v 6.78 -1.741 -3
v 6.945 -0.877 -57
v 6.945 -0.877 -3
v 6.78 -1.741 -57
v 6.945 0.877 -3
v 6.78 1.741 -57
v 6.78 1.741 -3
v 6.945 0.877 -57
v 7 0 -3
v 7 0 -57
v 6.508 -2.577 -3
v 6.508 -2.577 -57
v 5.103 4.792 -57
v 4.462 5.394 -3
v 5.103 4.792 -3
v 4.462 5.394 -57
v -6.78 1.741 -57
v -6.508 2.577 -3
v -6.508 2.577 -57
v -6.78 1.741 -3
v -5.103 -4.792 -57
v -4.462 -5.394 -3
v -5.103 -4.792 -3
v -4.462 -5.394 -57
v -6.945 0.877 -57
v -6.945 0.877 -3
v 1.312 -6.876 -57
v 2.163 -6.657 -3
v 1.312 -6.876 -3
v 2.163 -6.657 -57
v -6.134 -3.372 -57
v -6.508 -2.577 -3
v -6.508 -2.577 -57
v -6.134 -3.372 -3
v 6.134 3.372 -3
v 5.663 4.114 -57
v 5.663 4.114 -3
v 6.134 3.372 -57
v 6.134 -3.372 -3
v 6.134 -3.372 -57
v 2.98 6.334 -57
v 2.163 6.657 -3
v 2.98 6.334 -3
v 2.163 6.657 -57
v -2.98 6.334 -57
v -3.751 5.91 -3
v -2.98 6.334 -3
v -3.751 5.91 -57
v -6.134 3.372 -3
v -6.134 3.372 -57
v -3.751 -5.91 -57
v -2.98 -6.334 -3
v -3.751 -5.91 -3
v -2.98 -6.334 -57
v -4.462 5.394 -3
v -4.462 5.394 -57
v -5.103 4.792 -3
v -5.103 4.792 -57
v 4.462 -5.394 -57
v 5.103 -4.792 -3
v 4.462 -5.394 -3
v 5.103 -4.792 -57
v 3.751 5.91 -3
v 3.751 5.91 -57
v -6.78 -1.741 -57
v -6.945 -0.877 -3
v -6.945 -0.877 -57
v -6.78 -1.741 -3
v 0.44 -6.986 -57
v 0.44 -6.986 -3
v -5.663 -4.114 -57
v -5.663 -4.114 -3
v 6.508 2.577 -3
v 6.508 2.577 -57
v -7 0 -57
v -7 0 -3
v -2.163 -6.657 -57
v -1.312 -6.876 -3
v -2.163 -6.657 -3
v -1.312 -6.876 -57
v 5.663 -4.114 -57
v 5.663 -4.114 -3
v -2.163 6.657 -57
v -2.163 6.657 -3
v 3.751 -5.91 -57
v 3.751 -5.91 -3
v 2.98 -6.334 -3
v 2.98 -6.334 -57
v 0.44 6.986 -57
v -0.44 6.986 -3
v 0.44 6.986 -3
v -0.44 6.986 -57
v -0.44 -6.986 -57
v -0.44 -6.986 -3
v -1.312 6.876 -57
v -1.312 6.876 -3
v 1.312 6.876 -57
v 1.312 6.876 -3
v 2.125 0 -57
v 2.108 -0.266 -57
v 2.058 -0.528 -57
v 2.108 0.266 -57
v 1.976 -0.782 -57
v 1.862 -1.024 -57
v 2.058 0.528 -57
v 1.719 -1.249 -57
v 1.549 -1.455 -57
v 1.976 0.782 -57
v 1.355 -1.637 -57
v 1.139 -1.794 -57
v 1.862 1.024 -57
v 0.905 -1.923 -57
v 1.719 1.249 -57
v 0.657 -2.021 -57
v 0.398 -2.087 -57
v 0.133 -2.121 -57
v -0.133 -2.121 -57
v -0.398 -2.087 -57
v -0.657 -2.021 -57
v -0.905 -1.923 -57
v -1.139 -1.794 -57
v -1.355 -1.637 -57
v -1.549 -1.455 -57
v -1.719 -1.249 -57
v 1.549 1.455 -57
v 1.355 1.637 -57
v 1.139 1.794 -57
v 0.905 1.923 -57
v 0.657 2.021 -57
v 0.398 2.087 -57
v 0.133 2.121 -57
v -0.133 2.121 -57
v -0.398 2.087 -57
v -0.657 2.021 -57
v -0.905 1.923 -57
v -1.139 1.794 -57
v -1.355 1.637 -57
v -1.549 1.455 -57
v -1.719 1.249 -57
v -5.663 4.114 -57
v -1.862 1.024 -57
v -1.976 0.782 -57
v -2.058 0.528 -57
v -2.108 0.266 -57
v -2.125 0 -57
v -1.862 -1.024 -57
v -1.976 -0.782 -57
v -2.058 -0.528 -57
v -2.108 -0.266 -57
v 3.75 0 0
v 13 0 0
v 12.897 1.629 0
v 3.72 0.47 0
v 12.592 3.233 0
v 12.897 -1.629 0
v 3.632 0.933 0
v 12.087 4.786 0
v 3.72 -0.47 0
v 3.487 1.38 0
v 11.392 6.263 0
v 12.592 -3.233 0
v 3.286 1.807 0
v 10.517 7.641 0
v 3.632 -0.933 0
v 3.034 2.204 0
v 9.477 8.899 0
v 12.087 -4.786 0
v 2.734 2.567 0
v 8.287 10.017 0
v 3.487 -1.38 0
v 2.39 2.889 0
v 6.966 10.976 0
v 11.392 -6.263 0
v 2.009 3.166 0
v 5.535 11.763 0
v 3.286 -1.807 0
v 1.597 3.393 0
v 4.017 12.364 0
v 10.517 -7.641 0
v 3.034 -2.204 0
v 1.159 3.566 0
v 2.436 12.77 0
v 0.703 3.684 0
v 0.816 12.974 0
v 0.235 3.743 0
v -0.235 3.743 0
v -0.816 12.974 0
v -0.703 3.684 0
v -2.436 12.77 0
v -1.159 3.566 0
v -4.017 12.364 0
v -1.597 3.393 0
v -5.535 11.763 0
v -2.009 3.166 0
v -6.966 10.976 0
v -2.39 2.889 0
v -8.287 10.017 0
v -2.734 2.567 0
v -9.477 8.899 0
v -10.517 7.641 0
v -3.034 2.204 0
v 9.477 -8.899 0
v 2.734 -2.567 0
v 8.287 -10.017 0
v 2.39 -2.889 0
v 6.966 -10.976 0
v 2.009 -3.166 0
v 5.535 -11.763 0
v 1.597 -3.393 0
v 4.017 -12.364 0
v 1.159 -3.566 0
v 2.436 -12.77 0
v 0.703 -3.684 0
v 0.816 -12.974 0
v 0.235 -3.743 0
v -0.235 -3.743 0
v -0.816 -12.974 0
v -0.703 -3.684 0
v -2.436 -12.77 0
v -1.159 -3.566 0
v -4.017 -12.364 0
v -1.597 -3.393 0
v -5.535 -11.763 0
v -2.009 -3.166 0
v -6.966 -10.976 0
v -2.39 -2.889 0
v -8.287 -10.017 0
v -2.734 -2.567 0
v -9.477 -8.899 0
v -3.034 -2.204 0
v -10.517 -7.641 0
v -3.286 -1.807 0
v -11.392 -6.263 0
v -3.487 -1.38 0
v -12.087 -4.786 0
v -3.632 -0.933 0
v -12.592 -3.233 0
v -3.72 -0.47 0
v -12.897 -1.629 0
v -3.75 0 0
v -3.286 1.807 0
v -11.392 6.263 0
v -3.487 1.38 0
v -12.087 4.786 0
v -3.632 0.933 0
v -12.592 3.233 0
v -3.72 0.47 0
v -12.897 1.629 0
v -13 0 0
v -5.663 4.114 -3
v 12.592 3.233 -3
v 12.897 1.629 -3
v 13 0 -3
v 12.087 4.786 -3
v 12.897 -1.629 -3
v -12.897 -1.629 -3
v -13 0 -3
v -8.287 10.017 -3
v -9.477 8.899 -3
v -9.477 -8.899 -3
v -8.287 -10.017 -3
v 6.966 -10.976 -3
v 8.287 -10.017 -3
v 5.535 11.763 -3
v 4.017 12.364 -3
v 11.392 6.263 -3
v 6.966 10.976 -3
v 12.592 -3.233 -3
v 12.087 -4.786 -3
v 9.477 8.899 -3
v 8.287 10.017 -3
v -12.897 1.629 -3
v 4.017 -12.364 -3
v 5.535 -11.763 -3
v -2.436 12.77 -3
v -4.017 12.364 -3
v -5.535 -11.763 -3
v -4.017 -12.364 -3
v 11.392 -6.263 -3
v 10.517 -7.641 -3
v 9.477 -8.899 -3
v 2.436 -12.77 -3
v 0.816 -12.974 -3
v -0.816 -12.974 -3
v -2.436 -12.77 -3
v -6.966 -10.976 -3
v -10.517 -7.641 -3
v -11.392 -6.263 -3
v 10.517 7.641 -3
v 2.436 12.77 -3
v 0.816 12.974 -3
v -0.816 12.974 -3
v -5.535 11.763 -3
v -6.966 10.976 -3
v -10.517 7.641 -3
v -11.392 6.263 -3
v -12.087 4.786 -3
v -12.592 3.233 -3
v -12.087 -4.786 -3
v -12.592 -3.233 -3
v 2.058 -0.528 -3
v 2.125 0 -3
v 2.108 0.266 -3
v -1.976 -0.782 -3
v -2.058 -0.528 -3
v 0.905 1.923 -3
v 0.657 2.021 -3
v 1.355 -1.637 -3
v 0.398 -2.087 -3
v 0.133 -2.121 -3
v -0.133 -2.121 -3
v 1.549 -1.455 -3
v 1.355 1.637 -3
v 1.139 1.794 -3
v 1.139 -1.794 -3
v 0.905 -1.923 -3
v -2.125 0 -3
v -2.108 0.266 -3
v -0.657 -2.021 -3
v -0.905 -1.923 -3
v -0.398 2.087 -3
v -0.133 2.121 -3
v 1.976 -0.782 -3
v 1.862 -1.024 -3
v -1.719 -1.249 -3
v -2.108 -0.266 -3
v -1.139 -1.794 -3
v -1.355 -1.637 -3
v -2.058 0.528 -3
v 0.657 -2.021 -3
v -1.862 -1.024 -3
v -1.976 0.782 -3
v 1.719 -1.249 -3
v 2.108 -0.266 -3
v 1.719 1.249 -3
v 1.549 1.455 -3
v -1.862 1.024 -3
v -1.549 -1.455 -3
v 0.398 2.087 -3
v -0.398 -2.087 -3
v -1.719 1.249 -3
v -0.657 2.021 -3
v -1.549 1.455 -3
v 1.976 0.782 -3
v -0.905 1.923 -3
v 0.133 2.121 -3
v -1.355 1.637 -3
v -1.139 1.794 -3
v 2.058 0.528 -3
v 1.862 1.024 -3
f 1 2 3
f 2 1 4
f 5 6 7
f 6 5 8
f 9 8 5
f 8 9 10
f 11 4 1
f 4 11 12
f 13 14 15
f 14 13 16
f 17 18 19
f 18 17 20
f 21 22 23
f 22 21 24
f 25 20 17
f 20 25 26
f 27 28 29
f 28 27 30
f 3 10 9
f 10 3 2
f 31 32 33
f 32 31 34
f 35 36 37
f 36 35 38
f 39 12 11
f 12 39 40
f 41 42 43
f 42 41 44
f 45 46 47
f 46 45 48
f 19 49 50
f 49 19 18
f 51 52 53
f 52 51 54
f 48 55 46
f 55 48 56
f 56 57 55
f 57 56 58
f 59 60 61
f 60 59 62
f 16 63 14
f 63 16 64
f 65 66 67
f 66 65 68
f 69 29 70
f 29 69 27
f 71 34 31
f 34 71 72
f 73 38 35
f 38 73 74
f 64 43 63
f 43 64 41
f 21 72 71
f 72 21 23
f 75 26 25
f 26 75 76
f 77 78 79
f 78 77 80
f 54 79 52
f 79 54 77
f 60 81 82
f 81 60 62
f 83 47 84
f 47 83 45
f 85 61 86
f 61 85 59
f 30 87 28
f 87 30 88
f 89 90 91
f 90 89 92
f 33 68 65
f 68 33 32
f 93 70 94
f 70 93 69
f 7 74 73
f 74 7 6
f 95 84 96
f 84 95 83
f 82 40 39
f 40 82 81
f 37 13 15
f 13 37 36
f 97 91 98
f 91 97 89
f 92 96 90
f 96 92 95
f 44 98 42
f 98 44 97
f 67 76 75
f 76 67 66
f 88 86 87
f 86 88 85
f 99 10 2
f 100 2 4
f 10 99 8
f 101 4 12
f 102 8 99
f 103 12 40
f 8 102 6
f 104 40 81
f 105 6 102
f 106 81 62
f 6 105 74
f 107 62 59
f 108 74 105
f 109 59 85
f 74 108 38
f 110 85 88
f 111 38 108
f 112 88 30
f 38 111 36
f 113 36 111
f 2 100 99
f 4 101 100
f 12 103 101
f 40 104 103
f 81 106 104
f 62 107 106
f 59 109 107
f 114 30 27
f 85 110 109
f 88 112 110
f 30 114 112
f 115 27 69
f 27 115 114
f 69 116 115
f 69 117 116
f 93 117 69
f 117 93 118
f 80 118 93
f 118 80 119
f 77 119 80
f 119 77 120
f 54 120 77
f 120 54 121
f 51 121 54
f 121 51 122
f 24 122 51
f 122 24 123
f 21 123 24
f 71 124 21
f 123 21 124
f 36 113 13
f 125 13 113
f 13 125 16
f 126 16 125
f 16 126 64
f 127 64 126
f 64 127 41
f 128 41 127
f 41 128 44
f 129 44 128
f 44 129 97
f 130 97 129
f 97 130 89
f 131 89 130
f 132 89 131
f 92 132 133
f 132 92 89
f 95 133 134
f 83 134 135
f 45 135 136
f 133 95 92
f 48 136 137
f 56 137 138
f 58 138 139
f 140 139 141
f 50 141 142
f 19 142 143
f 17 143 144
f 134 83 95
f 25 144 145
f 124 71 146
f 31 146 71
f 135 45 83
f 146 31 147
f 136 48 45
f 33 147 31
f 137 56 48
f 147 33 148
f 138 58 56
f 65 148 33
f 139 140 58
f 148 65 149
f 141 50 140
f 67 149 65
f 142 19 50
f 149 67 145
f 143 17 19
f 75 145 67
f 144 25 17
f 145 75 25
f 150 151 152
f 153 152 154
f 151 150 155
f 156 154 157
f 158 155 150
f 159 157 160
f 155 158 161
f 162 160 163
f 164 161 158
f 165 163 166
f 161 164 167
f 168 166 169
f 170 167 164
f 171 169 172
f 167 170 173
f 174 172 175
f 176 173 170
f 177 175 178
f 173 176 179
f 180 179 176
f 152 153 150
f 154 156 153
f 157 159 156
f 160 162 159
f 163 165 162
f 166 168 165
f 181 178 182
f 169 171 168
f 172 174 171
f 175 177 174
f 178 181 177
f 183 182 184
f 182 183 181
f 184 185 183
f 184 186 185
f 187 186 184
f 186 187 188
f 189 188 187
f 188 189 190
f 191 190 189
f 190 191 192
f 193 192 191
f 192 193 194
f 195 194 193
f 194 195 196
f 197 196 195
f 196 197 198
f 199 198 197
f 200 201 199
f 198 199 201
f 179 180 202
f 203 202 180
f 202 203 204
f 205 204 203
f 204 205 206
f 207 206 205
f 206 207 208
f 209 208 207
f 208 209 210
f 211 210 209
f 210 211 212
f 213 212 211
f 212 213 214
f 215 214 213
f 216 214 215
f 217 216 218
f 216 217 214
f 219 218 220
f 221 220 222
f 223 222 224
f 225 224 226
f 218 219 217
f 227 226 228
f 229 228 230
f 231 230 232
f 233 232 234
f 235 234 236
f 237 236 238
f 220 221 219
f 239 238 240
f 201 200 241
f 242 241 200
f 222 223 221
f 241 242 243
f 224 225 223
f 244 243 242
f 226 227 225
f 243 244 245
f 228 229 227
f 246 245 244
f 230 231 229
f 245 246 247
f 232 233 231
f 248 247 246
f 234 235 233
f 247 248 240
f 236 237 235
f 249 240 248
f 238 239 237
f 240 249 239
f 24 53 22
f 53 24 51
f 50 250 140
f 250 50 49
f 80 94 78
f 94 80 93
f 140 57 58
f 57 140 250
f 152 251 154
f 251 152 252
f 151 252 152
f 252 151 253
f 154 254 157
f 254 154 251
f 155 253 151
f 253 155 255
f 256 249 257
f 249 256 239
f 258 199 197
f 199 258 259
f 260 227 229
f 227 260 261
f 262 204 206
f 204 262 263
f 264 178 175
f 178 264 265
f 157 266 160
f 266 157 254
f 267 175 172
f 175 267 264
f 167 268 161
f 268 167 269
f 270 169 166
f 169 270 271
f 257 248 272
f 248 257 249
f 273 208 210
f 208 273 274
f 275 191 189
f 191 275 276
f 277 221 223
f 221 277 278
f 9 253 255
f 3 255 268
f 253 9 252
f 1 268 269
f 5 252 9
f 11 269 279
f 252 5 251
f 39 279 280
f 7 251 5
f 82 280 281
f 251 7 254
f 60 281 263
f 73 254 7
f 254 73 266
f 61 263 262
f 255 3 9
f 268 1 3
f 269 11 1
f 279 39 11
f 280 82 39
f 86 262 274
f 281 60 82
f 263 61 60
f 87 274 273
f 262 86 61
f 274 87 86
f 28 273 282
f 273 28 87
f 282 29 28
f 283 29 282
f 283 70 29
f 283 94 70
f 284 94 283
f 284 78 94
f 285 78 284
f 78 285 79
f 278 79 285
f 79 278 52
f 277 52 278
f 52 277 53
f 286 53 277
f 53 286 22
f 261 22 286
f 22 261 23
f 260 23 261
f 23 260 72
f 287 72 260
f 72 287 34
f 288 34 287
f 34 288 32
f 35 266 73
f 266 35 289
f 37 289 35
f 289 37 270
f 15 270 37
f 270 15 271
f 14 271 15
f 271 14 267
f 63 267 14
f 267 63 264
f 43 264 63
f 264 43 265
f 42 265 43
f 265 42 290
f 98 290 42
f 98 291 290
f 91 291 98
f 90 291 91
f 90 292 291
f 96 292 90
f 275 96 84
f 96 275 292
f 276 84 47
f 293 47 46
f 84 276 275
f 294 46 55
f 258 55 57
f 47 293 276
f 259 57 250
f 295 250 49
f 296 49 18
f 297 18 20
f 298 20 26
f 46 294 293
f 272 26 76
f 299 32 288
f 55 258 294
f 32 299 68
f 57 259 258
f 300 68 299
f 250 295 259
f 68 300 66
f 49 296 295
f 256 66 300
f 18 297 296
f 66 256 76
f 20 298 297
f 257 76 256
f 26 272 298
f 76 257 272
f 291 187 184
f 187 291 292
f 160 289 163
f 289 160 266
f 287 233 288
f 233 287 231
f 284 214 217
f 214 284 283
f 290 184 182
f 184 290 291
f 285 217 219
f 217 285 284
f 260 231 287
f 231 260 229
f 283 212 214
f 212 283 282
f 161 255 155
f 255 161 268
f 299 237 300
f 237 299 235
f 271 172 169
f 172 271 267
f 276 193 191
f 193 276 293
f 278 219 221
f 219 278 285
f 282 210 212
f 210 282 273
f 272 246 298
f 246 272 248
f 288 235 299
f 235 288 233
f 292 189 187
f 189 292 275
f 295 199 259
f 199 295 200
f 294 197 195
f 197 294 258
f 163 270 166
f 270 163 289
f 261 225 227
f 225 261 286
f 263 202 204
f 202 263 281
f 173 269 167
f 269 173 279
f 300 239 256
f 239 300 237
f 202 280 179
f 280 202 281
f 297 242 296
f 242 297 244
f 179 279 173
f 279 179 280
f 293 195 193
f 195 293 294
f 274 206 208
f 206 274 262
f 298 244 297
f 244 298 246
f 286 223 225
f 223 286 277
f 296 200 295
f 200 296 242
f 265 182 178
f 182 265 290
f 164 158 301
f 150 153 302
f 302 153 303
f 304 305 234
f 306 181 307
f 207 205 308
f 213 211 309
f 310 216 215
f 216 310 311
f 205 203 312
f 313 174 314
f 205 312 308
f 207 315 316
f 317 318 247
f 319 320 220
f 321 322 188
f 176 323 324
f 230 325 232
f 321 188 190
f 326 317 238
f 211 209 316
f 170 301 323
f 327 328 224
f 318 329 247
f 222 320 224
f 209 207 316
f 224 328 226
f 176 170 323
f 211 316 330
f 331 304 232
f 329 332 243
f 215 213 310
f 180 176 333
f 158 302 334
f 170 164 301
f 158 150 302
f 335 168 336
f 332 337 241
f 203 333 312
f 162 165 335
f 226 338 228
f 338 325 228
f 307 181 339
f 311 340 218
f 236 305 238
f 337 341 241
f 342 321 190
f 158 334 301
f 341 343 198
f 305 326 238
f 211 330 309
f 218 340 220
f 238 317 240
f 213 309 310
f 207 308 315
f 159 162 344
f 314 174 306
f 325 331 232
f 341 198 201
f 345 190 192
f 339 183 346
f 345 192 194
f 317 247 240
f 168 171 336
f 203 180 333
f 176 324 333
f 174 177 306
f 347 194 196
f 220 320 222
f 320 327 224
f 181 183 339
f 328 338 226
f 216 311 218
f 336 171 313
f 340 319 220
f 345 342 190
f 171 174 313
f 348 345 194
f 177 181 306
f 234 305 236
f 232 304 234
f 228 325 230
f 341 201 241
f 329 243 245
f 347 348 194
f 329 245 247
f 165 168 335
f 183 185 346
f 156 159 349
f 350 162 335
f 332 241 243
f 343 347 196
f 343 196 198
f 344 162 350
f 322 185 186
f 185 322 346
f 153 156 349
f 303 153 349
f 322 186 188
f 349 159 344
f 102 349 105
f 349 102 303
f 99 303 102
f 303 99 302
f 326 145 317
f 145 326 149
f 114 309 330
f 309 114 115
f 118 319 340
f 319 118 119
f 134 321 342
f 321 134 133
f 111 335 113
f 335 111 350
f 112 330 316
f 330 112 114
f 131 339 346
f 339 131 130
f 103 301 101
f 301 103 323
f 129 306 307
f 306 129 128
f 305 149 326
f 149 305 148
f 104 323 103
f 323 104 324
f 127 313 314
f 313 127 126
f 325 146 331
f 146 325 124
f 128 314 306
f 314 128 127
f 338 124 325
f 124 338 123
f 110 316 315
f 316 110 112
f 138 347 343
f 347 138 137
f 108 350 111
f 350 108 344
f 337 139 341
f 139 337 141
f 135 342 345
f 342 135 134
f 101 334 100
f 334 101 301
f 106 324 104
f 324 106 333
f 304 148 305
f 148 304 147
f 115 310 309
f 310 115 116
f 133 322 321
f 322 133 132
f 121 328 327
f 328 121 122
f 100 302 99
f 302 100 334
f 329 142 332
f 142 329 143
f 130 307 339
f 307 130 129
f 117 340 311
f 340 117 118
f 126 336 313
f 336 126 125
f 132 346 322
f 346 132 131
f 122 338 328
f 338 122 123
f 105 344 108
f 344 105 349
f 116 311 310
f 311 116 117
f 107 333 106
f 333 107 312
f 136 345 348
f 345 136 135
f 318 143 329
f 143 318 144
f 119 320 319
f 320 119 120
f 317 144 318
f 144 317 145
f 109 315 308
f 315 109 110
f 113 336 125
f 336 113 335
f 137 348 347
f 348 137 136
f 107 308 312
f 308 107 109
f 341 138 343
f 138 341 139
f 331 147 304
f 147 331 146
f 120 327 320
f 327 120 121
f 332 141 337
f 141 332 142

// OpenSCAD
$fn = 50;


difference() {
	union() {
		translate(v = [0, 0, -57.0000000000]) {
			cylinder(h = 57, r = 7.0000000000);
		}
		translate(v = [0, 0, -3.0000000000]) {
			cylinder(h = 3, r = 13.0000000000);
		}
	}
	union() {
		translate(v = [0, 0, 0]) {
			rotate(a = [0, 0, 0]) {
				difference() {
					union() {
						#translate(v = [0, 0, -57.0000000000]) {
							cylinder(h = 57, r = 2.0000000000);
						}
						#translate(v = [0, 0, -3]) {
							cylinder(h = 3, r = 7.0000000000, r1 = 2.1250000000, r2 = 3.7500000000);
						}
						#translate(v = [0, 0, -57.0000000000]) {
							cylinder(h = 57, r = 2.1250000000);
						}
						#translate(v = [0, 0, -57.0000000000]) {
							cylinder(h = 57, r = 2.0000000000);
						}
					}
					union();
				}
			}
		}
	}
}
